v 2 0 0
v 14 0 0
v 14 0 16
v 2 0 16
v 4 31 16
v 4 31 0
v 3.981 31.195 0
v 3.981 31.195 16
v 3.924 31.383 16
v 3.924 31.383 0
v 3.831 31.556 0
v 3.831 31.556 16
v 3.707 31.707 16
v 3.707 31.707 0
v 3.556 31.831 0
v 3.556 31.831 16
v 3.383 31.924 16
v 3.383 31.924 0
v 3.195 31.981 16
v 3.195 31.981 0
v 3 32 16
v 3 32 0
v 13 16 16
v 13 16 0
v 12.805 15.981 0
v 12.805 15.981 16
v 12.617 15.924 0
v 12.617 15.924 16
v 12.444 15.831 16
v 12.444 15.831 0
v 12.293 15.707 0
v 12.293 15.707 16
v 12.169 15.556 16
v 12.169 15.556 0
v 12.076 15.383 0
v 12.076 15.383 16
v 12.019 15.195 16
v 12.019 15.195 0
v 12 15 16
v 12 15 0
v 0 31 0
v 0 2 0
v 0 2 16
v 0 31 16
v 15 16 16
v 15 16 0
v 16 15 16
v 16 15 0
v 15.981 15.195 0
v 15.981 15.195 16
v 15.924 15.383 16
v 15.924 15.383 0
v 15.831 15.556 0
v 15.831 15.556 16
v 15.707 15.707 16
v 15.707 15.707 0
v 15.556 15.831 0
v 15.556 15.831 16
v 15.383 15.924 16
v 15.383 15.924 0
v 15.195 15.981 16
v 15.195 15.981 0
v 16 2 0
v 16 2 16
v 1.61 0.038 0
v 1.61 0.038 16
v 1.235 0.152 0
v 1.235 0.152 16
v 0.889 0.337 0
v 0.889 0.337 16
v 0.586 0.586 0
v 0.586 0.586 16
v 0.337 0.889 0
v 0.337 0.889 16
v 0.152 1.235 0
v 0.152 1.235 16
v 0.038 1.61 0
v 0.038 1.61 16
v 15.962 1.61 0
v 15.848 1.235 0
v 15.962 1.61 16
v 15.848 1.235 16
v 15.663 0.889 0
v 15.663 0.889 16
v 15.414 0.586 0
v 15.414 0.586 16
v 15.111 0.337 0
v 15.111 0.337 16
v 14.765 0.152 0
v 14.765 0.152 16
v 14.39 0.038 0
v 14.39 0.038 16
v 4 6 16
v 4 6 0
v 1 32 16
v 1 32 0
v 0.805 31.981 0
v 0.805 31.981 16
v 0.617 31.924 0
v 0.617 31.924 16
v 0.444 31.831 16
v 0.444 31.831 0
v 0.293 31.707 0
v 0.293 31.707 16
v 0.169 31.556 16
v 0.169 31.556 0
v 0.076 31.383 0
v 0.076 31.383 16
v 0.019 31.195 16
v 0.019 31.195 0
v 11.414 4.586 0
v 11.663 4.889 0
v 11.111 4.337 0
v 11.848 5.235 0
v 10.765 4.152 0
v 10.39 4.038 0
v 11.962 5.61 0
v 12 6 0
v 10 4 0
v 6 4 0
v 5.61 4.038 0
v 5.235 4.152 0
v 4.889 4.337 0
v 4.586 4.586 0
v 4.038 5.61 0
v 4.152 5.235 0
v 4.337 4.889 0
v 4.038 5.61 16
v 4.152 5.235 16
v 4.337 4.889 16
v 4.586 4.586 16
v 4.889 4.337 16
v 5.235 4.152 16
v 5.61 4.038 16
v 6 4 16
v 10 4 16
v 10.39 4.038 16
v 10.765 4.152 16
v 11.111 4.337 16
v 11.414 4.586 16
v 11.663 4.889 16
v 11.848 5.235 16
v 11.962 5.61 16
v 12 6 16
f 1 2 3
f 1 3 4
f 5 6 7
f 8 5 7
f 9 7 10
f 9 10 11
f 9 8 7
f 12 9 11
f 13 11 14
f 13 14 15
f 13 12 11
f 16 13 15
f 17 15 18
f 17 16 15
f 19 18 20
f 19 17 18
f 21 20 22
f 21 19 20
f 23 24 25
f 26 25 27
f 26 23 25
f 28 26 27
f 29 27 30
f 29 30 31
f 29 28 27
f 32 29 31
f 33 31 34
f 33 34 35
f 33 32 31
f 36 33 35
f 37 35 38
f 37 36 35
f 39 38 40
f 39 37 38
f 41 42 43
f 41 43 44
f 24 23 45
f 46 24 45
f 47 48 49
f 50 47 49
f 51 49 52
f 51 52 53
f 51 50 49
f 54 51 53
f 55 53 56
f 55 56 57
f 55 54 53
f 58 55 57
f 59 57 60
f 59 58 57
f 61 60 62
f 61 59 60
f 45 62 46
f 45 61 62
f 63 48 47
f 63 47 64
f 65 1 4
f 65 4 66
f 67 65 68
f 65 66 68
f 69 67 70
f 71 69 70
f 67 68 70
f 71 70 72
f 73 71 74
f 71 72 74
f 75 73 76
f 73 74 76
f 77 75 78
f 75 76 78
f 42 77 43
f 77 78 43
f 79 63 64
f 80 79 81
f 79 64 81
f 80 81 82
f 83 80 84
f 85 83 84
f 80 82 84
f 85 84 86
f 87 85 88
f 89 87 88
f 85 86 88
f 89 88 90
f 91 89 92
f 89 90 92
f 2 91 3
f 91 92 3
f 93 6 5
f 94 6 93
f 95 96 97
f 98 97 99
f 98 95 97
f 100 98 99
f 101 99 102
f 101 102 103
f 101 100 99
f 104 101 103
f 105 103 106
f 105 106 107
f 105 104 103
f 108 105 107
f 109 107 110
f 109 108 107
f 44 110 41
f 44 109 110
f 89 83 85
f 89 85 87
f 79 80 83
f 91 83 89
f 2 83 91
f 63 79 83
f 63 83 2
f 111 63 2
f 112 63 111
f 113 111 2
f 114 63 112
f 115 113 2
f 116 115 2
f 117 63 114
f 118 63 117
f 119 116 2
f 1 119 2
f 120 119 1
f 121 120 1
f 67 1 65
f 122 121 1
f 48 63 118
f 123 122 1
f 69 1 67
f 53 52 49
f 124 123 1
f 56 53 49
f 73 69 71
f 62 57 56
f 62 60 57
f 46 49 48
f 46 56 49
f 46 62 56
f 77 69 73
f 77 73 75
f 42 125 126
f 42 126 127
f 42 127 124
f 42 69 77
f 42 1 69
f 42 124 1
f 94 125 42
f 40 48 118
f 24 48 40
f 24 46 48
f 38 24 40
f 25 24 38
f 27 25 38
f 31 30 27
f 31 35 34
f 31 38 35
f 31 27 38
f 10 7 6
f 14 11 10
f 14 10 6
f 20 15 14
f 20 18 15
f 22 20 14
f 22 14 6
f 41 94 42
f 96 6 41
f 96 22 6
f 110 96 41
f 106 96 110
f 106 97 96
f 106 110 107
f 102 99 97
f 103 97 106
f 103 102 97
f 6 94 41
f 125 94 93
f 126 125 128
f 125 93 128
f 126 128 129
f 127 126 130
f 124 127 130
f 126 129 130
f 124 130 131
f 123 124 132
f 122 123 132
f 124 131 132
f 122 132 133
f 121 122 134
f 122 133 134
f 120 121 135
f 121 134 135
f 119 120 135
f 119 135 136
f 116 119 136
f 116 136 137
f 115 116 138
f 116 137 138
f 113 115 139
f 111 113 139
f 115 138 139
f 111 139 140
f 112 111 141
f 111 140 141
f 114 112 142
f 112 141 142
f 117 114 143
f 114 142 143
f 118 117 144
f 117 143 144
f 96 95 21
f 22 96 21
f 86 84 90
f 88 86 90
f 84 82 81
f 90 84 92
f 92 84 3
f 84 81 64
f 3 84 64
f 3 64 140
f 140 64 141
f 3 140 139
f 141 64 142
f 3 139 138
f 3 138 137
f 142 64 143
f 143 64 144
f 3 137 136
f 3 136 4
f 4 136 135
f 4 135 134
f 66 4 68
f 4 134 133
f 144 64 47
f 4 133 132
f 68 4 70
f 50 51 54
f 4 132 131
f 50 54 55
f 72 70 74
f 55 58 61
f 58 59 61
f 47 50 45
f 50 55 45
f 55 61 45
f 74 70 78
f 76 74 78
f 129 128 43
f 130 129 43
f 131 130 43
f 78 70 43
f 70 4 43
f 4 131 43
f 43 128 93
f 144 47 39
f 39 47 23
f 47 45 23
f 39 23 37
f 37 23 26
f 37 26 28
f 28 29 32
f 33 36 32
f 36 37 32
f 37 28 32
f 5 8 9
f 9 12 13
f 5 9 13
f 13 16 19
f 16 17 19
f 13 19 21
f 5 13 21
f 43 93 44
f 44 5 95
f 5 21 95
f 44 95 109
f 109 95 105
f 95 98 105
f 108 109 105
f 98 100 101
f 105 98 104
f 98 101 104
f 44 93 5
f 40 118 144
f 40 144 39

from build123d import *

# Parameters (mm, degrees)
PAD_DEPTH   = 16
FILLET_R    = 2
FILLET001_R = 2
FILLET002_R = 2
FILLET003_R = 2
FILLET004_R = 1
FILLET005_R = 1
FILLET006_R = 1
FILLET007_R = 1


with BuildPart() as part:
    # Sketch → Pad (new body)
    with BuildSketch(Plane.XY):
        Polygon((0, 0), (0, 32), (4, 32), (4, 4), (12, 4), (12, 16), (16, 16), (16, 0), align=None)
    extrude(amount=PAD_DEPTH)

    # Fillet
    fillet_edges = [part.edges().sort_by_distance(p)[0] for p in [
        (4, 4, 8),
    ]]
    fillet(fillet_edges, radius=FILLET_R)

    # Fillet001
    fillet001_edges = [part.edges().sort_by_distance(p)[0] for p in [
        (12, 4, 8),
    ]]
    fillet(fillet001_edges, radius=FILLET001_R)

    # Fillet002
    fillet002_edges = [part.edges().sort_by_distance(p)[0] for p in [
        (16, 0, 8),
    ]]
    fillet(fillet002_edges, radius=FILLET002_R)

    # Fillet003
    fillet003_edges = [part.edges().sort_by_distance(p)[0] for p in [
        (0, 0, 8),
    ]]
    fillet(fillet003_edges, radius=FILLET003_R)

    # Fillet004
    fillet004_edges = [part.edges().sort_by_distance(p)[0] for p in [
        (16, 16, 8),
    ]]
    fillet(fillet004_edges, radius=FILLET004_R)

    # Fillet005
    fillet005_edges = [part.edges().sort_by_distance(p)[0] for p in [
        (12, 16, 8),
    ]]
    fillet(fillet005_edges, radius=FILLET005_R)

    # Fillet006
    fillet006_edges = [part.edges().sort_by_distance(p)[0] for p in [
        (4, 32, 8),
    ]]
    fillet(fillet006_edges, radius=FILLET006_R)

    # Fillet007
    fillet007_edges = [part.edges().sort_by_distance(p)[0] for p in [
        (0, 32, 8),
    ]]
    fillet(fillet007_edges, radius=FILLET007_R)


solid = part.part
